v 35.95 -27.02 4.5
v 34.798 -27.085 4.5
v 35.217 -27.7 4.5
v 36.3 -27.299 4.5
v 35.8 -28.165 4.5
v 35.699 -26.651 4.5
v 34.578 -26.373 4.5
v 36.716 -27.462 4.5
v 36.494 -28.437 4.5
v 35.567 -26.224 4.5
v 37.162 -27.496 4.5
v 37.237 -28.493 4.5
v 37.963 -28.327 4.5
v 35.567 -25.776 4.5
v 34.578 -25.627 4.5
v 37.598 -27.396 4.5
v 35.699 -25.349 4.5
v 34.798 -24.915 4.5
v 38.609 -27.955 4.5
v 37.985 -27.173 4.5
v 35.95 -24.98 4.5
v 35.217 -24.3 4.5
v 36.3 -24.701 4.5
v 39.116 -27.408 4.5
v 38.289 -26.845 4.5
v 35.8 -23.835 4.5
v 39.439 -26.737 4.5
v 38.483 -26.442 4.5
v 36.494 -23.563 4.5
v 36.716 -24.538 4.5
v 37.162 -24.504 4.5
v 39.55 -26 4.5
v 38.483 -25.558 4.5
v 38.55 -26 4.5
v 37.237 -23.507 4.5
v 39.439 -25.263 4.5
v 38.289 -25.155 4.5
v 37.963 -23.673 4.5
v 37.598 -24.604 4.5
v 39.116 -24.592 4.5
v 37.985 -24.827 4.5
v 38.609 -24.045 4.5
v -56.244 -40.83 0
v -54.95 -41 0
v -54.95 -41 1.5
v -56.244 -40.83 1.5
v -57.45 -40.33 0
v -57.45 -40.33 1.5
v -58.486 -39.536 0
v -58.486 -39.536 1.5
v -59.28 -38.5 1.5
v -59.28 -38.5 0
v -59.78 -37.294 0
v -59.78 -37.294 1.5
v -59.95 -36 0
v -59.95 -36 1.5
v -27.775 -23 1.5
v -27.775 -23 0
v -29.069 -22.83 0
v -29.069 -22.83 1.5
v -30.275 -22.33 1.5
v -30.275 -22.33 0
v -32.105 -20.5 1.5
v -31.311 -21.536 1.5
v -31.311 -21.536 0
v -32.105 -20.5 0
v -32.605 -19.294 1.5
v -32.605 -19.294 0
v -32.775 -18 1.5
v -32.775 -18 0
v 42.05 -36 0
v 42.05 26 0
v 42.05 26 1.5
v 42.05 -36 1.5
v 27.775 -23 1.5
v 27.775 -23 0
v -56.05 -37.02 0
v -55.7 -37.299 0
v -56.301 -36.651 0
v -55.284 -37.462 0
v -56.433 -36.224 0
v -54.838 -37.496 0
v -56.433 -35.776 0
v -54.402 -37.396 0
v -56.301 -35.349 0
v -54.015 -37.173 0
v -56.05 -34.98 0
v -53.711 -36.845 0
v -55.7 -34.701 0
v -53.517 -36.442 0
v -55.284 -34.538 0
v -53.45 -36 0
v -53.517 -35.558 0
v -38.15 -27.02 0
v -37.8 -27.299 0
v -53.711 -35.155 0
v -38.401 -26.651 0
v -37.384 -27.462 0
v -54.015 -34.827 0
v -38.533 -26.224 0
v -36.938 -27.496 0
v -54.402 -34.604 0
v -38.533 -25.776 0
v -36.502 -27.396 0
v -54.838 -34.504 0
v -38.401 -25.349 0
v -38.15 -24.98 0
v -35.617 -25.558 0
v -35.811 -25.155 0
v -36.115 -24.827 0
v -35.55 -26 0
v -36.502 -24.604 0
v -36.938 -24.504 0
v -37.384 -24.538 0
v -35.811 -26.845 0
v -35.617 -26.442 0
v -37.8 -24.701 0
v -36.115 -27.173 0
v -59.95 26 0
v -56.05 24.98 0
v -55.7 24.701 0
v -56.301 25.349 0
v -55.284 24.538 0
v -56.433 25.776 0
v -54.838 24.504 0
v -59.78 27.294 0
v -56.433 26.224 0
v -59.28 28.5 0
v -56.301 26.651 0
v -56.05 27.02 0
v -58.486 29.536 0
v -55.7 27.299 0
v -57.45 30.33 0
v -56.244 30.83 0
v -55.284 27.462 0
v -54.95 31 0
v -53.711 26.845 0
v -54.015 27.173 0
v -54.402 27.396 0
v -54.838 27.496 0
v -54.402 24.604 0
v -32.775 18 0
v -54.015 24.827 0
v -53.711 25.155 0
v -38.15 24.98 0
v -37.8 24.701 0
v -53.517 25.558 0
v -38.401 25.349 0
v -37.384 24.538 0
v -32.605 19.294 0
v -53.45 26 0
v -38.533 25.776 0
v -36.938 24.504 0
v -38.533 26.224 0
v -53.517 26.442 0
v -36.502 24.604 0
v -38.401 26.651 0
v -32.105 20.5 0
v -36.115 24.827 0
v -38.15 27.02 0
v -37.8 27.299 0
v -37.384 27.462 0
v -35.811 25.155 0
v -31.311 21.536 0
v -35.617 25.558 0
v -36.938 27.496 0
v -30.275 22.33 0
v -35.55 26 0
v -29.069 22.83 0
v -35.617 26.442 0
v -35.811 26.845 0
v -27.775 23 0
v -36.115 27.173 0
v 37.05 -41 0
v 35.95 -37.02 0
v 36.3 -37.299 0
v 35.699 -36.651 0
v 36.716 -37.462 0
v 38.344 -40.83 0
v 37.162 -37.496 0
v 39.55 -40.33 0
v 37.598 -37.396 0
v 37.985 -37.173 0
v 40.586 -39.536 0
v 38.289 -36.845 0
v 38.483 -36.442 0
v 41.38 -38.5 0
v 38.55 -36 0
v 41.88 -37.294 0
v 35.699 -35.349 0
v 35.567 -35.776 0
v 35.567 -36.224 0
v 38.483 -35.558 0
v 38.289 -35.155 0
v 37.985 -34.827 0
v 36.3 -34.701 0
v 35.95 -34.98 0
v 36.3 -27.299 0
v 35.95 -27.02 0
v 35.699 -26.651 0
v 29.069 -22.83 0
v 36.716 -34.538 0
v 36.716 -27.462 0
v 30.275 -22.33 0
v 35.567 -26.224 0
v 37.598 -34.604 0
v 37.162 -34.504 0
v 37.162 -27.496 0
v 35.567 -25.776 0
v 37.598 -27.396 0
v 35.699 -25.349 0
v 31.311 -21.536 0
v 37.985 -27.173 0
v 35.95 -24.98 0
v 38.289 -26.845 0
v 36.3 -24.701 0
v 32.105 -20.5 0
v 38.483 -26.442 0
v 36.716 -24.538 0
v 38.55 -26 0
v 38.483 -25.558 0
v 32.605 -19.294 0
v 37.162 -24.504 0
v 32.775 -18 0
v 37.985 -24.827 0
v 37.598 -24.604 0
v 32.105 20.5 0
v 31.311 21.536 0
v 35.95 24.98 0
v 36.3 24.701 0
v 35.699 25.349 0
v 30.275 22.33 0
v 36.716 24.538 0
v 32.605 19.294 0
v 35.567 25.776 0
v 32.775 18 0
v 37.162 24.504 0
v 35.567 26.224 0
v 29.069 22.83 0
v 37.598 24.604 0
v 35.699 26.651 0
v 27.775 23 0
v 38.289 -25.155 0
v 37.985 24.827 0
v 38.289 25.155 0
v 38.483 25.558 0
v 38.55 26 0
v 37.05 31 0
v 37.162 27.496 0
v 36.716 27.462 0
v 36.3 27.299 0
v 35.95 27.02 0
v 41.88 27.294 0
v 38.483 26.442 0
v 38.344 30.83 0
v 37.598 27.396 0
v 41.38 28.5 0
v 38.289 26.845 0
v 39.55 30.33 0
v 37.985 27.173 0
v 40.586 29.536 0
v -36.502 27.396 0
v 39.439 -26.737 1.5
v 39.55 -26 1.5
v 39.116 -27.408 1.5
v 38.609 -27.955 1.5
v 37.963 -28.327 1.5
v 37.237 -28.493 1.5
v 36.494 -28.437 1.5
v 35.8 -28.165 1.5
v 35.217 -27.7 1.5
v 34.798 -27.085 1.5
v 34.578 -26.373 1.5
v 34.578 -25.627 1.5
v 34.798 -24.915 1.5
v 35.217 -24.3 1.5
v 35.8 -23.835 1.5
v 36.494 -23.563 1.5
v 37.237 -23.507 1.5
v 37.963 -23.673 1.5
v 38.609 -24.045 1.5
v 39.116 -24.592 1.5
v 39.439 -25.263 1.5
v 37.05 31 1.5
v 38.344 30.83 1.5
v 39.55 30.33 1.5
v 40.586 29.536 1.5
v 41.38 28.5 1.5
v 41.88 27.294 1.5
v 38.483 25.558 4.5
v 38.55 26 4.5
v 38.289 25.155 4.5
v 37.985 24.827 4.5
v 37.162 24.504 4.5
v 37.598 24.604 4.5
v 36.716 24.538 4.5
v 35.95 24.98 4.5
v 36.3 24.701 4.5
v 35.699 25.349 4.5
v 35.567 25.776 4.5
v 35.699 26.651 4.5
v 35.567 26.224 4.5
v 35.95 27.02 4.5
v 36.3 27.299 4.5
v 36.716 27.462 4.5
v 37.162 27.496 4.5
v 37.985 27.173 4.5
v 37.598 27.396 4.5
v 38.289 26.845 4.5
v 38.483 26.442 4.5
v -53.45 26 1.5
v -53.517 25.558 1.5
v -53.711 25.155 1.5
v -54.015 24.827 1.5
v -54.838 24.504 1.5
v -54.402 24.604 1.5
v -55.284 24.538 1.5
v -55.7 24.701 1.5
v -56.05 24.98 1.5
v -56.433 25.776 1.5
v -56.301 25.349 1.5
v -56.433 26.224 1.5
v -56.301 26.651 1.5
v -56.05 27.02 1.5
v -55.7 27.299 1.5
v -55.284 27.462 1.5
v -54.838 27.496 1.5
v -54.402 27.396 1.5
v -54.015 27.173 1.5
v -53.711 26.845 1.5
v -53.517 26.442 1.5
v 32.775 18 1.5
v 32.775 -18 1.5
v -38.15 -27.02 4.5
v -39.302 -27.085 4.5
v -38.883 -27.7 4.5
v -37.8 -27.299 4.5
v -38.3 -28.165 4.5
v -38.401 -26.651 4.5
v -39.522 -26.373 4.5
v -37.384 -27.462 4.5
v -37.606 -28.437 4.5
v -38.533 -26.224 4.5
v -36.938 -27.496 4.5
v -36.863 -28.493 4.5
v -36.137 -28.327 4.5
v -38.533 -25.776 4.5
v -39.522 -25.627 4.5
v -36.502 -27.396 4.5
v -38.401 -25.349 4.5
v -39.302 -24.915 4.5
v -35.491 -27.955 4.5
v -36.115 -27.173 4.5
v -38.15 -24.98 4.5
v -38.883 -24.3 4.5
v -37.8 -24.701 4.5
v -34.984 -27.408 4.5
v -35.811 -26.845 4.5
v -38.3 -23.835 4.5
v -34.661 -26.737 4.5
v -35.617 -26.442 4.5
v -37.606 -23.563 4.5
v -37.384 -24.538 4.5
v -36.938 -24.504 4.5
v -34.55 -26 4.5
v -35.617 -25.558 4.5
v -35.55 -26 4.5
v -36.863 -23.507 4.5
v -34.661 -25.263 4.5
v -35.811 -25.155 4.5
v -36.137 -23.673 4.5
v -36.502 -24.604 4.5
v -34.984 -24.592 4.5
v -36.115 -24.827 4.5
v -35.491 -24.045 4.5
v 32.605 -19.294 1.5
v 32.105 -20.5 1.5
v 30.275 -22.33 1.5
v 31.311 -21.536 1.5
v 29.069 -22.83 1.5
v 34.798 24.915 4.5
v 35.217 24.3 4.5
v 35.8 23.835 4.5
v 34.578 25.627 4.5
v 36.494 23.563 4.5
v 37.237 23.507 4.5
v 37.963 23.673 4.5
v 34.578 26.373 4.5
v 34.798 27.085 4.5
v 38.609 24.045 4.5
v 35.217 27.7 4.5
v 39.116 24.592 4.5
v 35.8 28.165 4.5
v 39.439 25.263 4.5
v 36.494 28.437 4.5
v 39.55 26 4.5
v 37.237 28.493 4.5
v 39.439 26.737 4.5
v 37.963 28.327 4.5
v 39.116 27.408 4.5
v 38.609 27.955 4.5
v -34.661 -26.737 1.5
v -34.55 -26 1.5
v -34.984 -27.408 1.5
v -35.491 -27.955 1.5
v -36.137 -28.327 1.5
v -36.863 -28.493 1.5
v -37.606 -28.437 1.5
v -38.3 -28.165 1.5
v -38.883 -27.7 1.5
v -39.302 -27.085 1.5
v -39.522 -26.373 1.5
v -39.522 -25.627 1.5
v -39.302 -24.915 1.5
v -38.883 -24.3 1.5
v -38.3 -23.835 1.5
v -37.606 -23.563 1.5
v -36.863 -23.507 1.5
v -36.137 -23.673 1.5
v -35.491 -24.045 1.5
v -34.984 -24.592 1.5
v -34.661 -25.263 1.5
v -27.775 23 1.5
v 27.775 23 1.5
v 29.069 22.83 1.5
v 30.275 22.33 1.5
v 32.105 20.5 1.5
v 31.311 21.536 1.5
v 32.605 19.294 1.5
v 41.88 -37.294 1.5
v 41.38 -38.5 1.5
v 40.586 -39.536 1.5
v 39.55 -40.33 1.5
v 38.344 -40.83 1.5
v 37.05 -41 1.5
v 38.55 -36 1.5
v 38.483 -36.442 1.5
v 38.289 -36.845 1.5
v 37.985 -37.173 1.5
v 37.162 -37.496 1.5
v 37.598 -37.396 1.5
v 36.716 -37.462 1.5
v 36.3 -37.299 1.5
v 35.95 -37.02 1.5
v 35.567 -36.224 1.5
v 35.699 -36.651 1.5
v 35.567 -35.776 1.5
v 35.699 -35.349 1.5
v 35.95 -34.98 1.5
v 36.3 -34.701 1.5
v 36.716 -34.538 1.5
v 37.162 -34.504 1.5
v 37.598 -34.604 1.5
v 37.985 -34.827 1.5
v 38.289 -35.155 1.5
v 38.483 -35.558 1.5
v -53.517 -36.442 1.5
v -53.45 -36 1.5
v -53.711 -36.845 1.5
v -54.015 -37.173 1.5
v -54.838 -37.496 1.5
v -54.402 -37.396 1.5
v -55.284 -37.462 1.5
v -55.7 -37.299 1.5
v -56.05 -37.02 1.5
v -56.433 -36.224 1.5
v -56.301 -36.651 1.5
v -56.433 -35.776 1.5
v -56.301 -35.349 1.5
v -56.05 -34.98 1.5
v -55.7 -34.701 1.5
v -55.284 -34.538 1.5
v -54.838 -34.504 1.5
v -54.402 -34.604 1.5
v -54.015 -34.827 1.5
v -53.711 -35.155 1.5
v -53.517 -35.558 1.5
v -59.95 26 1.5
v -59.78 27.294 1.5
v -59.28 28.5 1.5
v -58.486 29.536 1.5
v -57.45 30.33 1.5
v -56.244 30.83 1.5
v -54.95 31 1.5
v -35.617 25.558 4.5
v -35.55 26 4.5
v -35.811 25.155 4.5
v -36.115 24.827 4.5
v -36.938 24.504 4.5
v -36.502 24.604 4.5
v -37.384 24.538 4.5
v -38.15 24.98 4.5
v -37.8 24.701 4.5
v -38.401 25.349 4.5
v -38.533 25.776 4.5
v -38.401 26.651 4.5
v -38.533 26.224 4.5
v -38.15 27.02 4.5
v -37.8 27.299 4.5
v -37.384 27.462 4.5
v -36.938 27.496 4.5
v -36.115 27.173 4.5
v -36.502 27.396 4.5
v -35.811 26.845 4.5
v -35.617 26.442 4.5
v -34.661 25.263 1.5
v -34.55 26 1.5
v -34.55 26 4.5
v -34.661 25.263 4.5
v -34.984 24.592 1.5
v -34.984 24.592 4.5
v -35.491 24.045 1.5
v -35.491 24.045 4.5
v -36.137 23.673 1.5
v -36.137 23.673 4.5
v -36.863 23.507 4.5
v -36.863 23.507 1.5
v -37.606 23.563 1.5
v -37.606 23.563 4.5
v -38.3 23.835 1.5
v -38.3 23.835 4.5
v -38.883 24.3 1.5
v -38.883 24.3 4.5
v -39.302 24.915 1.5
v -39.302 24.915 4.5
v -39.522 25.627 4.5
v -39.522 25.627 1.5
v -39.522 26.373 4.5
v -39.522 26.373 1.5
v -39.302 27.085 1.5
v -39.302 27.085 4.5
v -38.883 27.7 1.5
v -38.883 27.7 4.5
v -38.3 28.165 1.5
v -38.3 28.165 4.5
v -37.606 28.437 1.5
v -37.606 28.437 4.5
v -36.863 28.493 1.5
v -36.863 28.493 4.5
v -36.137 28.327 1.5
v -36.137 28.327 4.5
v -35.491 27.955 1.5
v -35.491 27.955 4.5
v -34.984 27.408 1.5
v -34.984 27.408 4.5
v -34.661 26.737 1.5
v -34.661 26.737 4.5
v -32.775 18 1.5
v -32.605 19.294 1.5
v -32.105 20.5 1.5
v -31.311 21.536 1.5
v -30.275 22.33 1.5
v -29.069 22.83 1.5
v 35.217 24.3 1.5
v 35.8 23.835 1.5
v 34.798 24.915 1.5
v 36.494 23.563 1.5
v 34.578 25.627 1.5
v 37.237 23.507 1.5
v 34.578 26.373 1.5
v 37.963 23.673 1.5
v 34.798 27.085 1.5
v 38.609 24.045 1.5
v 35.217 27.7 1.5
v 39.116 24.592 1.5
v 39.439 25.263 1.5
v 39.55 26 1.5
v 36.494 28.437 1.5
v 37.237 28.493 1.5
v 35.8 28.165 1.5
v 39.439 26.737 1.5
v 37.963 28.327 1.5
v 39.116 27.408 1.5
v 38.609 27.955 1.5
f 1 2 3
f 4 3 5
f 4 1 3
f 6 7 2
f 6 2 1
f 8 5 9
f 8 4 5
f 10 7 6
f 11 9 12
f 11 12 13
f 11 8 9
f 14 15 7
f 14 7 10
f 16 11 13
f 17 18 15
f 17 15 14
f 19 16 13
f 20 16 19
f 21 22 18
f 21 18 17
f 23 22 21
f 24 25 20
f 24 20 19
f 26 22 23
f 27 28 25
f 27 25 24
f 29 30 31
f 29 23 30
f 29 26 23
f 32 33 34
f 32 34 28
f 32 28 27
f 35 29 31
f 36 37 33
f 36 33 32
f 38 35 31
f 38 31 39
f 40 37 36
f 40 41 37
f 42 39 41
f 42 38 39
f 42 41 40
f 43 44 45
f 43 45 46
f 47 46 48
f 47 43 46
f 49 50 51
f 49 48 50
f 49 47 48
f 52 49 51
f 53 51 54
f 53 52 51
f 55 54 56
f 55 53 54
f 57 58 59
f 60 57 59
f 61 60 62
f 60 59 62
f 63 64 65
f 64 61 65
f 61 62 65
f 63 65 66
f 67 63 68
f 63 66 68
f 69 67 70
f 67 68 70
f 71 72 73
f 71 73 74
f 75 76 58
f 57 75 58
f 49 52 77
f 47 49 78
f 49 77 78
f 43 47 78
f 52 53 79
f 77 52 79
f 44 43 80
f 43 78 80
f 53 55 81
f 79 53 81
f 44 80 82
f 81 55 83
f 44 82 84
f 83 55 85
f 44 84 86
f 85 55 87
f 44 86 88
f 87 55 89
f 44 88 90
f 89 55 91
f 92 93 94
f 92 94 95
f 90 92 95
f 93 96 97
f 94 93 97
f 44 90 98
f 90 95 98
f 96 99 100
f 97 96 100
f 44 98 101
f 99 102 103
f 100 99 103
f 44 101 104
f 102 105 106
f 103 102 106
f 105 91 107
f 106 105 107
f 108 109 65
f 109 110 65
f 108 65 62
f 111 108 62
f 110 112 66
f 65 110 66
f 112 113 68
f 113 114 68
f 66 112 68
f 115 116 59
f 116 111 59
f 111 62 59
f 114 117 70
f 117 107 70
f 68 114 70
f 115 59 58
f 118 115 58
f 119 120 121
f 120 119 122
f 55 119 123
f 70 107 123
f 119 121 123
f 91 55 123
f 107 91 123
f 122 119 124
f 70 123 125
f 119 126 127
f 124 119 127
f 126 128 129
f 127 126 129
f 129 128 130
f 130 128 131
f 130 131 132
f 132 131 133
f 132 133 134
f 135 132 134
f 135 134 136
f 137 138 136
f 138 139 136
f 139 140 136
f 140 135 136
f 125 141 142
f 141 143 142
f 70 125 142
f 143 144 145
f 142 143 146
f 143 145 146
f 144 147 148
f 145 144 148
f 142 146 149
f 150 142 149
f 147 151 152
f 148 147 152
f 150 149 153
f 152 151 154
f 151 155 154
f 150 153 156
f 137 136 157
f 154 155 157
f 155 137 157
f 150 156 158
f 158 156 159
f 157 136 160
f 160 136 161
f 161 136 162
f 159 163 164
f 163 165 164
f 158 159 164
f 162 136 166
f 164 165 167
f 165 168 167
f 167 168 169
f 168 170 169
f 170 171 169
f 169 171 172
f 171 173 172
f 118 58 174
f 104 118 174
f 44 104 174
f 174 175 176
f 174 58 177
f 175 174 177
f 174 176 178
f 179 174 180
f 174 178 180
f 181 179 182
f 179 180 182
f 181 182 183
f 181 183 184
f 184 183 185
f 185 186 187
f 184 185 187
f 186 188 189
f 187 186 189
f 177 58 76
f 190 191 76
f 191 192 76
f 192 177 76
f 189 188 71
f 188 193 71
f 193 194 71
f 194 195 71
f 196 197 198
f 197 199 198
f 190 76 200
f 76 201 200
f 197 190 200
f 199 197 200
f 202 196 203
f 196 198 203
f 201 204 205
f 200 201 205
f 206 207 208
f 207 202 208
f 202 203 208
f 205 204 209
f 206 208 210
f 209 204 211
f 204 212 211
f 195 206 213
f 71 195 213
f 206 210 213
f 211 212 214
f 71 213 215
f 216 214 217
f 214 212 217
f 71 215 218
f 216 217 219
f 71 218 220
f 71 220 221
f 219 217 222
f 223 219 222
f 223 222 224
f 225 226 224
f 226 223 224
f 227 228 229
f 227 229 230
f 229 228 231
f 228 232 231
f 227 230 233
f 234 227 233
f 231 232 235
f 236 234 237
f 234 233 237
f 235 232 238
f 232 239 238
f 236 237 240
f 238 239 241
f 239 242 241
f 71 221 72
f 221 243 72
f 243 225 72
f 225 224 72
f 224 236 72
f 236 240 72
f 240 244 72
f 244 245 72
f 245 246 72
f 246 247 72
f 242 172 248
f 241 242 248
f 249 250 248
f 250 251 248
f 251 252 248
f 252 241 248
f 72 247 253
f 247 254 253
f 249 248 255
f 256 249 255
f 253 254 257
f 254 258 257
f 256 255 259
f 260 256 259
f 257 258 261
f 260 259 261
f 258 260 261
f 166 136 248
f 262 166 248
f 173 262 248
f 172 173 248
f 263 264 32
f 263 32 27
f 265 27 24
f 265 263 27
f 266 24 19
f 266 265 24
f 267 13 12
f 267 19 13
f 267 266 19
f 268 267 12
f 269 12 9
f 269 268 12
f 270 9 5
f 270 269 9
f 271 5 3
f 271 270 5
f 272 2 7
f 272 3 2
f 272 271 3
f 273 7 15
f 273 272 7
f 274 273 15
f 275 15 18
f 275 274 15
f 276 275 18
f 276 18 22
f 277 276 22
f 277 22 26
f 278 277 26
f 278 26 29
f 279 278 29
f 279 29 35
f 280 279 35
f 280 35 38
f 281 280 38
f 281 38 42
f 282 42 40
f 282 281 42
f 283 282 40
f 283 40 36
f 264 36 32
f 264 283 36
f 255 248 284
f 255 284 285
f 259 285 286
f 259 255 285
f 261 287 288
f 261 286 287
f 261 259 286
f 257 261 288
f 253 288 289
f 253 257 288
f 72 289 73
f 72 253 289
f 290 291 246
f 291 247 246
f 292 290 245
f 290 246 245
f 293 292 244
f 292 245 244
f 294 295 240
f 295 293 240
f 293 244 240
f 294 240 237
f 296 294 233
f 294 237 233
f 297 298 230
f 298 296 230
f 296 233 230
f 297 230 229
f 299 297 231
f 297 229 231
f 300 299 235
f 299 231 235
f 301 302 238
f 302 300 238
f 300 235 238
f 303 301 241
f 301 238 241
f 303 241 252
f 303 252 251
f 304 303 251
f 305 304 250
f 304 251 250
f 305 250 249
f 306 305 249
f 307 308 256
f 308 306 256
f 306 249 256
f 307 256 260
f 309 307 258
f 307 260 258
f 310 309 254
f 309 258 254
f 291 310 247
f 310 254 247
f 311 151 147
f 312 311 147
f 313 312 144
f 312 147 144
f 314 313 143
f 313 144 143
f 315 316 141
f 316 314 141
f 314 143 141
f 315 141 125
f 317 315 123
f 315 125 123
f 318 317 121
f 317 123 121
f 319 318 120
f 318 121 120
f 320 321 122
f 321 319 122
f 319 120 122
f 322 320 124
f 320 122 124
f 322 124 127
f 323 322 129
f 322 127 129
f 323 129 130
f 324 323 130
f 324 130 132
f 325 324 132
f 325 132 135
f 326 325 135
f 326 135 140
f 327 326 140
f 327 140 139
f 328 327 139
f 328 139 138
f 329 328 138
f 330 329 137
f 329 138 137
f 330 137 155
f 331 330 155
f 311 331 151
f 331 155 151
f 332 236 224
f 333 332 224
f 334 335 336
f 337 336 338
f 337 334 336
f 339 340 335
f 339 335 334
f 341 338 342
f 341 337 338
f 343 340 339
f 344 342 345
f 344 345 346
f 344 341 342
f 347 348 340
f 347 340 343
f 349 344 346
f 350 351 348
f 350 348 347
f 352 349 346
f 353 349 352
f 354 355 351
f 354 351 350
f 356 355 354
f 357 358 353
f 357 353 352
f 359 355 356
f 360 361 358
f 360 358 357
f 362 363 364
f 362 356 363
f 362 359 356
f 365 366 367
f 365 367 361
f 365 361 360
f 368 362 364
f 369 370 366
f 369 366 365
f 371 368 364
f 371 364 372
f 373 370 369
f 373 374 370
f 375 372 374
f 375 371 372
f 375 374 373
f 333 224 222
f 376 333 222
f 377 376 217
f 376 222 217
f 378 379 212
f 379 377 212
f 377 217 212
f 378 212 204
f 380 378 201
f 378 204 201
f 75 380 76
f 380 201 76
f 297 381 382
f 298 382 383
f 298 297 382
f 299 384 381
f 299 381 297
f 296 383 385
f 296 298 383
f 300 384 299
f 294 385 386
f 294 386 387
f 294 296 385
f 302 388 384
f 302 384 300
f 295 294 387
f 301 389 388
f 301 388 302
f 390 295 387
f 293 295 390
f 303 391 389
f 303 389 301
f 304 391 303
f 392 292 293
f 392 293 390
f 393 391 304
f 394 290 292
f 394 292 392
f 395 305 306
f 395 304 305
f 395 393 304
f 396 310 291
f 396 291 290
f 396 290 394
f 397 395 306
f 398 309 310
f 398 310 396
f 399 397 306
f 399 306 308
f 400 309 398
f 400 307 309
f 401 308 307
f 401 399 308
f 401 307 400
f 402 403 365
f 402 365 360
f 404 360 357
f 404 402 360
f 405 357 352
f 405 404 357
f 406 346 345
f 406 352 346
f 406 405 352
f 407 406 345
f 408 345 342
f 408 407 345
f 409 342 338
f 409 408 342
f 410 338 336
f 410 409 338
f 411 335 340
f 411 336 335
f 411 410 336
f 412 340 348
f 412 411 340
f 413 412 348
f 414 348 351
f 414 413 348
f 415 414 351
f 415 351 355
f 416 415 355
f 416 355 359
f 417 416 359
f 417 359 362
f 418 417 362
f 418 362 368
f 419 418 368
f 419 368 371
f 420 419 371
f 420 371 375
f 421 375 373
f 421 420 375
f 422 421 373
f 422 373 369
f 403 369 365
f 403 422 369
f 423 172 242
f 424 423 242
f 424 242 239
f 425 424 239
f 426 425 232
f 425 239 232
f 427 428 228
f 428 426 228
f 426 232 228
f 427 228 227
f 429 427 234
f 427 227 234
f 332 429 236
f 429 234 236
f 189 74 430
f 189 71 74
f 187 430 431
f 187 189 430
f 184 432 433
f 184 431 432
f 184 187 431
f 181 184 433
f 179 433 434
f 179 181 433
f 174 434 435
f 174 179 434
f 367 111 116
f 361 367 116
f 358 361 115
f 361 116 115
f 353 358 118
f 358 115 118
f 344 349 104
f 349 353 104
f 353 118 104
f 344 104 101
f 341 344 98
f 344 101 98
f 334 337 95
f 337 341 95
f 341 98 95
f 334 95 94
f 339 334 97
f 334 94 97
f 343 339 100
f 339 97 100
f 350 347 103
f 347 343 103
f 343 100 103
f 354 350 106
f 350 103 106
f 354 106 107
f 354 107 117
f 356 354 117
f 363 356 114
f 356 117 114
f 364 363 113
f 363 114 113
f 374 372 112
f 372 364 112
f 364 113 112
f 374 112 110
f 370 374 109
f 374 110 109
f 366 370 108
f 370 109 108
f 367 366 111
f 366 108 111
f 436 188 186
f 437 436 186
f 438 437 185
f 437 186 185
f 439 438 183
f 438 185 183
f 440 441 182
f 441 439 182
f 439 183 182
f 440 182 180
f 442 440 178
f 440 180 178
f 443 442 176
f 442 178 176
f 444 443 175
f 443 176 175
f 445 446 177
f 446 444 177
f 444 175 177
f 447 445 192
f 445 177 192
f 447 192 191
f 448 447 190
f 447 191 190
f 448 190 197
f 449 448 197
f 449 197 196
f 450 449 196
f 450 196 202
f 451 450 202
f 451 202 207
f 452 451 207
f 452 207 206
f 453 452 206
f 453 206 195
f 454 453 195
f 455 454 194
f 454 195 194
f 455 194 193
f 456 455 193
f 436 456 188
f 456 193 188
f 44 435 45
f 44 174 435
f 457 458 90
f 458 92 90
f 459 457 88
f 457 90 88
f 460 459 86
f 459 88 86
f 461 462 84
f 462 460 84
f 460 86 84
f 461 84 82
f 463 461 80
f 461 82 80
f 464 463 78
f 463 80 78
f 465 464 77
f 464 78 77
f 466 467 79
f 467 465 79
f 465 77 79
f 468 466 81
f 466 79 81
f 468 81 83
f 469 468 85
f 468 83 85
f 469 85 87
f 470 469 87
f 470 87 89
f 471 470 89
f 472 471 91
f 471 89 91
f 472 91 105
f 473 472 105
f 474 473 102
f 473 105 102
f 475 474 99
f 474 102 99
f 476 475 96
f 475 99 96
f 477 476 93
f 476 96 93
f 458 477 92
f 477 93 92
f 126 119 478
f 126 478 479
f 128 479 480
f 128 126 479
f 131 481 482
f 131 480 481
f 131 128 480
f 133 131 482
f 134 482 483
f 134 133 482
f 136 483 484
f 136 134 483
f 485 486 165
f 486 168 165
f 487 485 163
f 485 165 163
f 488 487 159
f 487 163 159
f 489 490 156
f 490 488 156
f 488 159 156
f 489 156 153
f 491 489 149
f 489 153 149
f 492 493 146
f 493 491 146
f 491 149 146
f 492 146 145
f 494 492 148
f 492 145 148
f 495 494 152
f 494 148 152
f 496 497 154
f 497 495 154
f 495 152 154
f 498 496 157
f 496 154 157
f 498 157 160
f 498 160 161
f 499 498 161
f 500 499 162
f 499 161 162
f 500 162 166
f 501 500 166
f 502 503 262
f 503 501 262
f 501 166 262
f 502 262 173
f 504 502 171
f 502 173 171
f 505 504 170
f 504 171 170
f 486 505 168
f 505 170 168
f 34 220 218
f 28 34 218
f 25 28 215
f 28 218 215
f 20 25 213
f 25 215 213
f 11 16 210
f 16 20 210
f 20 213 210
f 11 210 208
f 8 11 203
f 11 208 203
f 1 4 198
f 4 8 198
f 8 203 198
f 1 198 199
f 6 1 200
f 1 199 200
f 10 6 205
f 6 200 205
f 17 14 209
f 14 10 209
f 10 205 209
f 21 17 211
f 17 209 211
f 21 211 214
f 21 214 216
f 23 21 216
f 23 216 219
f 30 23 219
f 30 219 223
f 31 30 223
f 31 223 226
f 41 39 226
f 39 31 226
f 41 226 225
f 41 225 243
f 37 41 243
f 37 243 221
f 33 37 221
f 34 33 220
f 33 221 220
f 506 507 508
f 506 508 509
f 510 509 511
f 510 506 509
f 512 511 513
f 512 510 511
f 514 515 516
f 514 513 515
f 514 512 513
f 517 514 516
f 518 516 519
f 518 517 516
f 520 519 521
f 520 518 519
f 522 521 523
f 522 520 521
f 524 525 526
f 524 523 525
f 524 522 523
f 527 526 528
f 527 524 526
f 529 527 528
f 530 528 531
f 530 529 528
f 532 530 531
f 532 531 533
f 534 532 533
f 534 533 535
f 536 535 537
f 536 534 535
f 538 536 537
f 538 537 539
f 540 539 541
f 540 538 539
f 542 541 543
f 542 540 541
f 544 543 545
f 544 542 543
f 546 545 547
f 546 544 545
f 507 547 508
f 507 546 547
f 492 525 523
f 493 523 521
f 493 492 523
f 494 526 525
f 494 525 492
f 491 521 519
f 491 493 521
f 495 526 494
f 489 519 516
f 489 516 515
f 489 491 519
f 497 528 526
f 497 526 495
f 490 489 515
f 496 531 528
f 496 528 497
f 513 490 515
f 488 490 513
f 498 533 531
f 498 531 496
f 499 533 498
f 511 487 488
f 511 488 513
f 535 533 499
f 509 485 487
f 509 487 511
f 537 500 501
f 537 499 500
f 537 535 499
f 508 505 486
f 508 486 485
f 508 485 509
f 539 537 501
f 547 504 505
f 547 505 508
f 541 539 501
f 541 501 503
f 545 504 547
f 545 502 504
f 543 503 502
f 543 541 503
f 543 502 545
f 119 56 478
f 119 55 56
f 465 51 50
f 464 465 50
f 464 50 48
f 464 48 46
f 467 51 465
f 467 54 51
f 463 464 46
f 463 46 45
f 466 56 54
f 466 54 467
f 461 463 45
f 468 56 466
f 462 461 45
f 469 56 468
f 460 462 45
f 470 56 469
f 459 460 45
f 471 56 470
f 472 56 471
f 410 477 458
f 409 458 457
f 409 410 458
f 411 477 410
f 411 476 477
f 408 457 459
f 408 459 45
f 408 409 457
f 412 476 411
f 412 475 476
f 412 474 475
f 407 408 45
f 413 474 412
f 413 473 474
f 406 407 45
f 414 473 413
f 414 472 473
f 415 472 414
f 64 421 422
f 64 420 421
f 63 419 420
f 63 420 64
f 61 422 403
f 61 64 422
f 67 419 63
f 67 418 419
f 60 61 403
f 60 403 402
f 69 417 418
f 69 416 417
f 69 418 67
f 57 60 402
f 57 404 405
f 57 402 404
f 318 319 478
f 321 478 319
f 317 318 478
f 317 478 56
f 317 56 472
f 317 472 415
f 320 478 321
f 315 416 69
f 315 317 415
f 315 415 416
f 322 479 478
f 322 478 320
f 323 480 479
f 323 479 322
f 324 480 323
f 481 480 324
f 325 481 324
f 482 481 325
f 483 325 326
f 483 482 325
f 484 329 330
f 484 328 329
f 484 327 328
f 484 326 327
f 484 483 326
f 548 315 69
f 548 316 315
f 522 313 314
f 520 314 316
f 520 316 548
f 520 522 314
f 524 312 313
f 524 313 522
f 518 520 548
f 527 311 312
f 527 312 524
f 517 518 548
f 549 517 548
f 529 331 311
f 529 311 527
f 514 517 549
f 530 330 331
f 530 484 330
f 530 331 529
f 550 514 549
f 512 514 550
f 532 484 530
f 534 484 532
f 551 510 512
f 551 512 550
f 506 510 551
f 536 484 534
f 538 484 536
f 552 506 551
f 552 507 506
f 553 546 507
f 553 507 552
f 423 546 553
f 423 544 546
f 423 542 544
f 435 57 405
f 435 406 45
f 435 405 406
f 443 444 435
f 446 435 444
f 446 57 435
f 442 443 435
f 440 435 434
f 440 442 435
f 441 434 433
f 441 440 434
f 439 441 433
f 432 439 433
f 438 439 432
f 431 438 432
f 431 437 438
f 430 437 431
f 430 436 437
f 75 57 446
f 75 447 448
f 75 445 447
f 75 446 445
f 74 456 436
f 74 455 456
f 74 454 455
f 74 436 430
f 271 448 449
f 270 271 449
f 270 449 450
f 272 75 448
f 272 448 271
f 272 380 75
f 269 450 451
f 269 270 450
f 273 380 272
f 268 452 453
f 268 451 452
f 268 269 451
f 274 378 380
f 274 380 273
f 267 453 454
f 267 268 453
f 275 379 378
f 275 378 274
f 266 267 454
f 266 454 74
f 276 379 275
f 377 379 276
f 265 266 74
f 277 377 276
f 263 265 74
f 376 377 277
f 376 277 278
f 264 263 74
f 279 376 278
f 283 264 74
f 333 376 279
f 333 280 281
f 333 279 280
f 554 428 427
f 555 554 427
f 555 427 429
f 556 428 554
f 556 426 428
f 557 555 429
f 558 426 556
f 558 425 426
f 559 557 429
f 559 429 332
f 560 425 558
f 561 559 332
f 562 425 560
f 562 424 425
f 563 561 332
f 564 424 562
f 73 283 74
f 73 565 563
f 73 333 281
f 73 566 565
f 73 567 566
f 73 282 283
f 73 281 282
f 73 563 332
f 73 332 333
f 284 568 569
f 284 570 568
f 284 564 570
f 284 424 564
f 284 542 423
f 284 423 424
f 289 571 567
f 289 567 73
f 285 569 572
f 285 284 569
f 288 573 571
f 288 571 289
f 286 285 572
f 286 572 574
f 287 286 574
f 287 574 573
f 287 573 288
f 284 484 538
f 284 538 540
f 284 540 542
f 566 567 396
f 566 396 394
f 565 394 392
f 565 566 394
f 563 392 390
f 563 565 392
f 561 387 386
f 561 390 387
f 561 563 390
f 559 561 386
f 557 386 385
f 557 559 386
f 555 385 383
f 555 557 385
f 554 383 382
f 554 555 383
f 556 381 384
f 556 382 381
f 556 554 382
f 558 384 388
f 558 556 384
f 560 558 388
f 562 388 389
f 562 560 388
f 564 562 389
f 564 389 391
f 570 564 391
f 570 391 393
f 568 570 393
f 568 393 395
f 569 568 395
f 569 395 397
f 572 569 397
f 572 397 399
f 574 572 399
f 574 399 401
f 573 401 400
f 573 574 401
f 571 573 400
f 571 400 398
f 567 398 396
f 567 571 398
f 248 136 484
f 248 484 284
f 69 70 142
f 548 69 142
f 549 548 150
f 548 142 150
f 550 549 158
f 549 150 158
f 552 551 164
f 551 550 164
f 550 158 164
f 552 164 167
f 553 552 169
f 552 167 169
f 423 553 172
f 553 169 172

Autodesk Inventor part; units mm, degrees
ref_plane "YZ Plane" through (0, 0, 0) normal (1, 0, 0) x (0, 1, 0)
ref_plane "XZ Plane" through (0, 0, 0) normal (0, 1, 0) x (-1, 0, 0)
ref_plane "XY Plane" through (0, 0, 0) normal (0, 0, 1) x (1, 0, 0)
sketch "Sketch1" plane through (0, 0, 0) normal (0, 0, 1) x (1, 0, 0)
  line L0 (-37.05, 26) -> (37.05, 26) construction
  line L1 (37.05, 26) -> (37.05, -26) construction
  line L2 (37.05, -26) -> (-37.05, -26) construction
  line L3 (-37.05, -26) -> (-37.05, 26) construction
  line L4 (-37.05, 26) -> (37.05, -26) construction
  line L5 (37.05, 26) -> (-37.05, -26) construction
  circle A0 centre (37.05, 26) radius 1.5
  circle A1 centre (37.05, -26) radius 1.5
  circle A2 centre (-37.05, -26) radius 1.5
  circle A3 centre (-37.05, 26) radius 1.5
  line L6 (0, 45) -> (0, 0) construction
  line L7 (-18.2065, -55) -> (-18.2065, -15) construction
  circle A4 centre (37.05, 26) radius 3 construction
  circle A5 centre (37.05, -26) radius 3 construction
  circle A6 centre (-37.05, -26) radius 3 construction
  circle A7 centre (-37.05, 26) radius 3 construction
  line L8 (37.05, 26) -> (-54.95, 26) construction
  line L9 (-54.95, 26) -> (-54.95, -36) construction
  line L10 (-54.95, -36) -> (37.05, -36) construction
  line L11 (37.05, -36) -> (37.05, 26) construction
  circle A8 centre (-54.95, 26) radius 1.5
  circle A9 centre (-54.95, -36) radius 1.5
  circle A10 centre (37.05, -36) radius 1.5
  line L12 (-54.95, 31) -> (37.05, 31)
  line L13 (42.05, 26) -> (42.05, -36)
  line L14 (37.05, -41) -> (-54.95, -41)
  line L15 (-59.95, -36) -> (-59.95, 26)
  arc A11 (-54.95, 31) -> (-59.95, 26) centre (-54.95, 26) ccw
  arc A12 (-59.95, -36) -> (-54.95, -41) centre (-54.95, -36) ccw
  arc A13 (37.05, -41) -> (42.05, -36) centre (37.05, -36) ccw
  arc A14 (42.05, 26) -> (37.05, 31) centre (37.05, 26) ccw
  line L16 (27.775, -23) -> (-27.775, -23)
  line L17 (-32.775, -18) -> (-32.775, 18)
  line L18 (-27.775, 23) -> (27.775, 23)
  line L19 (32.775, 18) -> (32.775, -18)
  line L20 (32.775, -23) -> (-32.775, 23) construction
  line L21 (-32.775, -23) -> (32.775, 23) construction
  arc A15 (-27.775, 23) -> (-32.775, 18) centre (-27.775, 18) ccw
  arc A16 (32.775, 18) -> (27.775, 23) centre (27.775, 18) ccw
  arc A17 (27.775, -23) -> (32.775, -18) centre (27.775, -18) ccw
  arc A18 (-32.775, -18) -> (-27.775, -23) centre (-27.775, -18) ccw
  point P0 (0, 0)
  point P1 (0, 0)
  dimension "d0" = 74.1
  dimension "d1" = 52
  dimension "d2" = 3
  dimension "d3" = 45
  dimension "d4" = 6
  dimension "d5" = 0
  dimension "d8" = 62
  dimension "d9" = 92
  dimension "d10" = 5
  dimension "d11" = 5
  dimension "d12" = 5
  dimension "d13" = 5
  dimension "d14" = 5
  dimension "d15" = 5
  dimension "d16" = 3
extrude "Extrusion1" add sketch "Sketch1" along normal blind 1.5
sketch "Sketch2" plane through (0, 0, 1.5) normal (0, 0, 1) x (1, 0, 0)
  circle A0 centre (-37.05, 26) radius 1.5 projected
  circle A1 centre (-37.05, 26) radius 2.5
  circle A2 centre (37.05, 26) radius 1.5 projected
  circle A3 centre (37.05, 26) radius 2.5
  circle A4 centre (37.05, -26) radius 1.5 projected
  circle A5 centre (37.05, -26) radius 2.5
  circle A6 centre (-37.05, -26) radius 1.5 projected
  circle A7 centre (-37.05, -26) radius 2.5
  point P0 (0, 0)
  dimension "d19" = 5
extrude "Extrusion2" add sketch "Sketch2" along normal blind 3
properties part number "NewMoboAdapter"
